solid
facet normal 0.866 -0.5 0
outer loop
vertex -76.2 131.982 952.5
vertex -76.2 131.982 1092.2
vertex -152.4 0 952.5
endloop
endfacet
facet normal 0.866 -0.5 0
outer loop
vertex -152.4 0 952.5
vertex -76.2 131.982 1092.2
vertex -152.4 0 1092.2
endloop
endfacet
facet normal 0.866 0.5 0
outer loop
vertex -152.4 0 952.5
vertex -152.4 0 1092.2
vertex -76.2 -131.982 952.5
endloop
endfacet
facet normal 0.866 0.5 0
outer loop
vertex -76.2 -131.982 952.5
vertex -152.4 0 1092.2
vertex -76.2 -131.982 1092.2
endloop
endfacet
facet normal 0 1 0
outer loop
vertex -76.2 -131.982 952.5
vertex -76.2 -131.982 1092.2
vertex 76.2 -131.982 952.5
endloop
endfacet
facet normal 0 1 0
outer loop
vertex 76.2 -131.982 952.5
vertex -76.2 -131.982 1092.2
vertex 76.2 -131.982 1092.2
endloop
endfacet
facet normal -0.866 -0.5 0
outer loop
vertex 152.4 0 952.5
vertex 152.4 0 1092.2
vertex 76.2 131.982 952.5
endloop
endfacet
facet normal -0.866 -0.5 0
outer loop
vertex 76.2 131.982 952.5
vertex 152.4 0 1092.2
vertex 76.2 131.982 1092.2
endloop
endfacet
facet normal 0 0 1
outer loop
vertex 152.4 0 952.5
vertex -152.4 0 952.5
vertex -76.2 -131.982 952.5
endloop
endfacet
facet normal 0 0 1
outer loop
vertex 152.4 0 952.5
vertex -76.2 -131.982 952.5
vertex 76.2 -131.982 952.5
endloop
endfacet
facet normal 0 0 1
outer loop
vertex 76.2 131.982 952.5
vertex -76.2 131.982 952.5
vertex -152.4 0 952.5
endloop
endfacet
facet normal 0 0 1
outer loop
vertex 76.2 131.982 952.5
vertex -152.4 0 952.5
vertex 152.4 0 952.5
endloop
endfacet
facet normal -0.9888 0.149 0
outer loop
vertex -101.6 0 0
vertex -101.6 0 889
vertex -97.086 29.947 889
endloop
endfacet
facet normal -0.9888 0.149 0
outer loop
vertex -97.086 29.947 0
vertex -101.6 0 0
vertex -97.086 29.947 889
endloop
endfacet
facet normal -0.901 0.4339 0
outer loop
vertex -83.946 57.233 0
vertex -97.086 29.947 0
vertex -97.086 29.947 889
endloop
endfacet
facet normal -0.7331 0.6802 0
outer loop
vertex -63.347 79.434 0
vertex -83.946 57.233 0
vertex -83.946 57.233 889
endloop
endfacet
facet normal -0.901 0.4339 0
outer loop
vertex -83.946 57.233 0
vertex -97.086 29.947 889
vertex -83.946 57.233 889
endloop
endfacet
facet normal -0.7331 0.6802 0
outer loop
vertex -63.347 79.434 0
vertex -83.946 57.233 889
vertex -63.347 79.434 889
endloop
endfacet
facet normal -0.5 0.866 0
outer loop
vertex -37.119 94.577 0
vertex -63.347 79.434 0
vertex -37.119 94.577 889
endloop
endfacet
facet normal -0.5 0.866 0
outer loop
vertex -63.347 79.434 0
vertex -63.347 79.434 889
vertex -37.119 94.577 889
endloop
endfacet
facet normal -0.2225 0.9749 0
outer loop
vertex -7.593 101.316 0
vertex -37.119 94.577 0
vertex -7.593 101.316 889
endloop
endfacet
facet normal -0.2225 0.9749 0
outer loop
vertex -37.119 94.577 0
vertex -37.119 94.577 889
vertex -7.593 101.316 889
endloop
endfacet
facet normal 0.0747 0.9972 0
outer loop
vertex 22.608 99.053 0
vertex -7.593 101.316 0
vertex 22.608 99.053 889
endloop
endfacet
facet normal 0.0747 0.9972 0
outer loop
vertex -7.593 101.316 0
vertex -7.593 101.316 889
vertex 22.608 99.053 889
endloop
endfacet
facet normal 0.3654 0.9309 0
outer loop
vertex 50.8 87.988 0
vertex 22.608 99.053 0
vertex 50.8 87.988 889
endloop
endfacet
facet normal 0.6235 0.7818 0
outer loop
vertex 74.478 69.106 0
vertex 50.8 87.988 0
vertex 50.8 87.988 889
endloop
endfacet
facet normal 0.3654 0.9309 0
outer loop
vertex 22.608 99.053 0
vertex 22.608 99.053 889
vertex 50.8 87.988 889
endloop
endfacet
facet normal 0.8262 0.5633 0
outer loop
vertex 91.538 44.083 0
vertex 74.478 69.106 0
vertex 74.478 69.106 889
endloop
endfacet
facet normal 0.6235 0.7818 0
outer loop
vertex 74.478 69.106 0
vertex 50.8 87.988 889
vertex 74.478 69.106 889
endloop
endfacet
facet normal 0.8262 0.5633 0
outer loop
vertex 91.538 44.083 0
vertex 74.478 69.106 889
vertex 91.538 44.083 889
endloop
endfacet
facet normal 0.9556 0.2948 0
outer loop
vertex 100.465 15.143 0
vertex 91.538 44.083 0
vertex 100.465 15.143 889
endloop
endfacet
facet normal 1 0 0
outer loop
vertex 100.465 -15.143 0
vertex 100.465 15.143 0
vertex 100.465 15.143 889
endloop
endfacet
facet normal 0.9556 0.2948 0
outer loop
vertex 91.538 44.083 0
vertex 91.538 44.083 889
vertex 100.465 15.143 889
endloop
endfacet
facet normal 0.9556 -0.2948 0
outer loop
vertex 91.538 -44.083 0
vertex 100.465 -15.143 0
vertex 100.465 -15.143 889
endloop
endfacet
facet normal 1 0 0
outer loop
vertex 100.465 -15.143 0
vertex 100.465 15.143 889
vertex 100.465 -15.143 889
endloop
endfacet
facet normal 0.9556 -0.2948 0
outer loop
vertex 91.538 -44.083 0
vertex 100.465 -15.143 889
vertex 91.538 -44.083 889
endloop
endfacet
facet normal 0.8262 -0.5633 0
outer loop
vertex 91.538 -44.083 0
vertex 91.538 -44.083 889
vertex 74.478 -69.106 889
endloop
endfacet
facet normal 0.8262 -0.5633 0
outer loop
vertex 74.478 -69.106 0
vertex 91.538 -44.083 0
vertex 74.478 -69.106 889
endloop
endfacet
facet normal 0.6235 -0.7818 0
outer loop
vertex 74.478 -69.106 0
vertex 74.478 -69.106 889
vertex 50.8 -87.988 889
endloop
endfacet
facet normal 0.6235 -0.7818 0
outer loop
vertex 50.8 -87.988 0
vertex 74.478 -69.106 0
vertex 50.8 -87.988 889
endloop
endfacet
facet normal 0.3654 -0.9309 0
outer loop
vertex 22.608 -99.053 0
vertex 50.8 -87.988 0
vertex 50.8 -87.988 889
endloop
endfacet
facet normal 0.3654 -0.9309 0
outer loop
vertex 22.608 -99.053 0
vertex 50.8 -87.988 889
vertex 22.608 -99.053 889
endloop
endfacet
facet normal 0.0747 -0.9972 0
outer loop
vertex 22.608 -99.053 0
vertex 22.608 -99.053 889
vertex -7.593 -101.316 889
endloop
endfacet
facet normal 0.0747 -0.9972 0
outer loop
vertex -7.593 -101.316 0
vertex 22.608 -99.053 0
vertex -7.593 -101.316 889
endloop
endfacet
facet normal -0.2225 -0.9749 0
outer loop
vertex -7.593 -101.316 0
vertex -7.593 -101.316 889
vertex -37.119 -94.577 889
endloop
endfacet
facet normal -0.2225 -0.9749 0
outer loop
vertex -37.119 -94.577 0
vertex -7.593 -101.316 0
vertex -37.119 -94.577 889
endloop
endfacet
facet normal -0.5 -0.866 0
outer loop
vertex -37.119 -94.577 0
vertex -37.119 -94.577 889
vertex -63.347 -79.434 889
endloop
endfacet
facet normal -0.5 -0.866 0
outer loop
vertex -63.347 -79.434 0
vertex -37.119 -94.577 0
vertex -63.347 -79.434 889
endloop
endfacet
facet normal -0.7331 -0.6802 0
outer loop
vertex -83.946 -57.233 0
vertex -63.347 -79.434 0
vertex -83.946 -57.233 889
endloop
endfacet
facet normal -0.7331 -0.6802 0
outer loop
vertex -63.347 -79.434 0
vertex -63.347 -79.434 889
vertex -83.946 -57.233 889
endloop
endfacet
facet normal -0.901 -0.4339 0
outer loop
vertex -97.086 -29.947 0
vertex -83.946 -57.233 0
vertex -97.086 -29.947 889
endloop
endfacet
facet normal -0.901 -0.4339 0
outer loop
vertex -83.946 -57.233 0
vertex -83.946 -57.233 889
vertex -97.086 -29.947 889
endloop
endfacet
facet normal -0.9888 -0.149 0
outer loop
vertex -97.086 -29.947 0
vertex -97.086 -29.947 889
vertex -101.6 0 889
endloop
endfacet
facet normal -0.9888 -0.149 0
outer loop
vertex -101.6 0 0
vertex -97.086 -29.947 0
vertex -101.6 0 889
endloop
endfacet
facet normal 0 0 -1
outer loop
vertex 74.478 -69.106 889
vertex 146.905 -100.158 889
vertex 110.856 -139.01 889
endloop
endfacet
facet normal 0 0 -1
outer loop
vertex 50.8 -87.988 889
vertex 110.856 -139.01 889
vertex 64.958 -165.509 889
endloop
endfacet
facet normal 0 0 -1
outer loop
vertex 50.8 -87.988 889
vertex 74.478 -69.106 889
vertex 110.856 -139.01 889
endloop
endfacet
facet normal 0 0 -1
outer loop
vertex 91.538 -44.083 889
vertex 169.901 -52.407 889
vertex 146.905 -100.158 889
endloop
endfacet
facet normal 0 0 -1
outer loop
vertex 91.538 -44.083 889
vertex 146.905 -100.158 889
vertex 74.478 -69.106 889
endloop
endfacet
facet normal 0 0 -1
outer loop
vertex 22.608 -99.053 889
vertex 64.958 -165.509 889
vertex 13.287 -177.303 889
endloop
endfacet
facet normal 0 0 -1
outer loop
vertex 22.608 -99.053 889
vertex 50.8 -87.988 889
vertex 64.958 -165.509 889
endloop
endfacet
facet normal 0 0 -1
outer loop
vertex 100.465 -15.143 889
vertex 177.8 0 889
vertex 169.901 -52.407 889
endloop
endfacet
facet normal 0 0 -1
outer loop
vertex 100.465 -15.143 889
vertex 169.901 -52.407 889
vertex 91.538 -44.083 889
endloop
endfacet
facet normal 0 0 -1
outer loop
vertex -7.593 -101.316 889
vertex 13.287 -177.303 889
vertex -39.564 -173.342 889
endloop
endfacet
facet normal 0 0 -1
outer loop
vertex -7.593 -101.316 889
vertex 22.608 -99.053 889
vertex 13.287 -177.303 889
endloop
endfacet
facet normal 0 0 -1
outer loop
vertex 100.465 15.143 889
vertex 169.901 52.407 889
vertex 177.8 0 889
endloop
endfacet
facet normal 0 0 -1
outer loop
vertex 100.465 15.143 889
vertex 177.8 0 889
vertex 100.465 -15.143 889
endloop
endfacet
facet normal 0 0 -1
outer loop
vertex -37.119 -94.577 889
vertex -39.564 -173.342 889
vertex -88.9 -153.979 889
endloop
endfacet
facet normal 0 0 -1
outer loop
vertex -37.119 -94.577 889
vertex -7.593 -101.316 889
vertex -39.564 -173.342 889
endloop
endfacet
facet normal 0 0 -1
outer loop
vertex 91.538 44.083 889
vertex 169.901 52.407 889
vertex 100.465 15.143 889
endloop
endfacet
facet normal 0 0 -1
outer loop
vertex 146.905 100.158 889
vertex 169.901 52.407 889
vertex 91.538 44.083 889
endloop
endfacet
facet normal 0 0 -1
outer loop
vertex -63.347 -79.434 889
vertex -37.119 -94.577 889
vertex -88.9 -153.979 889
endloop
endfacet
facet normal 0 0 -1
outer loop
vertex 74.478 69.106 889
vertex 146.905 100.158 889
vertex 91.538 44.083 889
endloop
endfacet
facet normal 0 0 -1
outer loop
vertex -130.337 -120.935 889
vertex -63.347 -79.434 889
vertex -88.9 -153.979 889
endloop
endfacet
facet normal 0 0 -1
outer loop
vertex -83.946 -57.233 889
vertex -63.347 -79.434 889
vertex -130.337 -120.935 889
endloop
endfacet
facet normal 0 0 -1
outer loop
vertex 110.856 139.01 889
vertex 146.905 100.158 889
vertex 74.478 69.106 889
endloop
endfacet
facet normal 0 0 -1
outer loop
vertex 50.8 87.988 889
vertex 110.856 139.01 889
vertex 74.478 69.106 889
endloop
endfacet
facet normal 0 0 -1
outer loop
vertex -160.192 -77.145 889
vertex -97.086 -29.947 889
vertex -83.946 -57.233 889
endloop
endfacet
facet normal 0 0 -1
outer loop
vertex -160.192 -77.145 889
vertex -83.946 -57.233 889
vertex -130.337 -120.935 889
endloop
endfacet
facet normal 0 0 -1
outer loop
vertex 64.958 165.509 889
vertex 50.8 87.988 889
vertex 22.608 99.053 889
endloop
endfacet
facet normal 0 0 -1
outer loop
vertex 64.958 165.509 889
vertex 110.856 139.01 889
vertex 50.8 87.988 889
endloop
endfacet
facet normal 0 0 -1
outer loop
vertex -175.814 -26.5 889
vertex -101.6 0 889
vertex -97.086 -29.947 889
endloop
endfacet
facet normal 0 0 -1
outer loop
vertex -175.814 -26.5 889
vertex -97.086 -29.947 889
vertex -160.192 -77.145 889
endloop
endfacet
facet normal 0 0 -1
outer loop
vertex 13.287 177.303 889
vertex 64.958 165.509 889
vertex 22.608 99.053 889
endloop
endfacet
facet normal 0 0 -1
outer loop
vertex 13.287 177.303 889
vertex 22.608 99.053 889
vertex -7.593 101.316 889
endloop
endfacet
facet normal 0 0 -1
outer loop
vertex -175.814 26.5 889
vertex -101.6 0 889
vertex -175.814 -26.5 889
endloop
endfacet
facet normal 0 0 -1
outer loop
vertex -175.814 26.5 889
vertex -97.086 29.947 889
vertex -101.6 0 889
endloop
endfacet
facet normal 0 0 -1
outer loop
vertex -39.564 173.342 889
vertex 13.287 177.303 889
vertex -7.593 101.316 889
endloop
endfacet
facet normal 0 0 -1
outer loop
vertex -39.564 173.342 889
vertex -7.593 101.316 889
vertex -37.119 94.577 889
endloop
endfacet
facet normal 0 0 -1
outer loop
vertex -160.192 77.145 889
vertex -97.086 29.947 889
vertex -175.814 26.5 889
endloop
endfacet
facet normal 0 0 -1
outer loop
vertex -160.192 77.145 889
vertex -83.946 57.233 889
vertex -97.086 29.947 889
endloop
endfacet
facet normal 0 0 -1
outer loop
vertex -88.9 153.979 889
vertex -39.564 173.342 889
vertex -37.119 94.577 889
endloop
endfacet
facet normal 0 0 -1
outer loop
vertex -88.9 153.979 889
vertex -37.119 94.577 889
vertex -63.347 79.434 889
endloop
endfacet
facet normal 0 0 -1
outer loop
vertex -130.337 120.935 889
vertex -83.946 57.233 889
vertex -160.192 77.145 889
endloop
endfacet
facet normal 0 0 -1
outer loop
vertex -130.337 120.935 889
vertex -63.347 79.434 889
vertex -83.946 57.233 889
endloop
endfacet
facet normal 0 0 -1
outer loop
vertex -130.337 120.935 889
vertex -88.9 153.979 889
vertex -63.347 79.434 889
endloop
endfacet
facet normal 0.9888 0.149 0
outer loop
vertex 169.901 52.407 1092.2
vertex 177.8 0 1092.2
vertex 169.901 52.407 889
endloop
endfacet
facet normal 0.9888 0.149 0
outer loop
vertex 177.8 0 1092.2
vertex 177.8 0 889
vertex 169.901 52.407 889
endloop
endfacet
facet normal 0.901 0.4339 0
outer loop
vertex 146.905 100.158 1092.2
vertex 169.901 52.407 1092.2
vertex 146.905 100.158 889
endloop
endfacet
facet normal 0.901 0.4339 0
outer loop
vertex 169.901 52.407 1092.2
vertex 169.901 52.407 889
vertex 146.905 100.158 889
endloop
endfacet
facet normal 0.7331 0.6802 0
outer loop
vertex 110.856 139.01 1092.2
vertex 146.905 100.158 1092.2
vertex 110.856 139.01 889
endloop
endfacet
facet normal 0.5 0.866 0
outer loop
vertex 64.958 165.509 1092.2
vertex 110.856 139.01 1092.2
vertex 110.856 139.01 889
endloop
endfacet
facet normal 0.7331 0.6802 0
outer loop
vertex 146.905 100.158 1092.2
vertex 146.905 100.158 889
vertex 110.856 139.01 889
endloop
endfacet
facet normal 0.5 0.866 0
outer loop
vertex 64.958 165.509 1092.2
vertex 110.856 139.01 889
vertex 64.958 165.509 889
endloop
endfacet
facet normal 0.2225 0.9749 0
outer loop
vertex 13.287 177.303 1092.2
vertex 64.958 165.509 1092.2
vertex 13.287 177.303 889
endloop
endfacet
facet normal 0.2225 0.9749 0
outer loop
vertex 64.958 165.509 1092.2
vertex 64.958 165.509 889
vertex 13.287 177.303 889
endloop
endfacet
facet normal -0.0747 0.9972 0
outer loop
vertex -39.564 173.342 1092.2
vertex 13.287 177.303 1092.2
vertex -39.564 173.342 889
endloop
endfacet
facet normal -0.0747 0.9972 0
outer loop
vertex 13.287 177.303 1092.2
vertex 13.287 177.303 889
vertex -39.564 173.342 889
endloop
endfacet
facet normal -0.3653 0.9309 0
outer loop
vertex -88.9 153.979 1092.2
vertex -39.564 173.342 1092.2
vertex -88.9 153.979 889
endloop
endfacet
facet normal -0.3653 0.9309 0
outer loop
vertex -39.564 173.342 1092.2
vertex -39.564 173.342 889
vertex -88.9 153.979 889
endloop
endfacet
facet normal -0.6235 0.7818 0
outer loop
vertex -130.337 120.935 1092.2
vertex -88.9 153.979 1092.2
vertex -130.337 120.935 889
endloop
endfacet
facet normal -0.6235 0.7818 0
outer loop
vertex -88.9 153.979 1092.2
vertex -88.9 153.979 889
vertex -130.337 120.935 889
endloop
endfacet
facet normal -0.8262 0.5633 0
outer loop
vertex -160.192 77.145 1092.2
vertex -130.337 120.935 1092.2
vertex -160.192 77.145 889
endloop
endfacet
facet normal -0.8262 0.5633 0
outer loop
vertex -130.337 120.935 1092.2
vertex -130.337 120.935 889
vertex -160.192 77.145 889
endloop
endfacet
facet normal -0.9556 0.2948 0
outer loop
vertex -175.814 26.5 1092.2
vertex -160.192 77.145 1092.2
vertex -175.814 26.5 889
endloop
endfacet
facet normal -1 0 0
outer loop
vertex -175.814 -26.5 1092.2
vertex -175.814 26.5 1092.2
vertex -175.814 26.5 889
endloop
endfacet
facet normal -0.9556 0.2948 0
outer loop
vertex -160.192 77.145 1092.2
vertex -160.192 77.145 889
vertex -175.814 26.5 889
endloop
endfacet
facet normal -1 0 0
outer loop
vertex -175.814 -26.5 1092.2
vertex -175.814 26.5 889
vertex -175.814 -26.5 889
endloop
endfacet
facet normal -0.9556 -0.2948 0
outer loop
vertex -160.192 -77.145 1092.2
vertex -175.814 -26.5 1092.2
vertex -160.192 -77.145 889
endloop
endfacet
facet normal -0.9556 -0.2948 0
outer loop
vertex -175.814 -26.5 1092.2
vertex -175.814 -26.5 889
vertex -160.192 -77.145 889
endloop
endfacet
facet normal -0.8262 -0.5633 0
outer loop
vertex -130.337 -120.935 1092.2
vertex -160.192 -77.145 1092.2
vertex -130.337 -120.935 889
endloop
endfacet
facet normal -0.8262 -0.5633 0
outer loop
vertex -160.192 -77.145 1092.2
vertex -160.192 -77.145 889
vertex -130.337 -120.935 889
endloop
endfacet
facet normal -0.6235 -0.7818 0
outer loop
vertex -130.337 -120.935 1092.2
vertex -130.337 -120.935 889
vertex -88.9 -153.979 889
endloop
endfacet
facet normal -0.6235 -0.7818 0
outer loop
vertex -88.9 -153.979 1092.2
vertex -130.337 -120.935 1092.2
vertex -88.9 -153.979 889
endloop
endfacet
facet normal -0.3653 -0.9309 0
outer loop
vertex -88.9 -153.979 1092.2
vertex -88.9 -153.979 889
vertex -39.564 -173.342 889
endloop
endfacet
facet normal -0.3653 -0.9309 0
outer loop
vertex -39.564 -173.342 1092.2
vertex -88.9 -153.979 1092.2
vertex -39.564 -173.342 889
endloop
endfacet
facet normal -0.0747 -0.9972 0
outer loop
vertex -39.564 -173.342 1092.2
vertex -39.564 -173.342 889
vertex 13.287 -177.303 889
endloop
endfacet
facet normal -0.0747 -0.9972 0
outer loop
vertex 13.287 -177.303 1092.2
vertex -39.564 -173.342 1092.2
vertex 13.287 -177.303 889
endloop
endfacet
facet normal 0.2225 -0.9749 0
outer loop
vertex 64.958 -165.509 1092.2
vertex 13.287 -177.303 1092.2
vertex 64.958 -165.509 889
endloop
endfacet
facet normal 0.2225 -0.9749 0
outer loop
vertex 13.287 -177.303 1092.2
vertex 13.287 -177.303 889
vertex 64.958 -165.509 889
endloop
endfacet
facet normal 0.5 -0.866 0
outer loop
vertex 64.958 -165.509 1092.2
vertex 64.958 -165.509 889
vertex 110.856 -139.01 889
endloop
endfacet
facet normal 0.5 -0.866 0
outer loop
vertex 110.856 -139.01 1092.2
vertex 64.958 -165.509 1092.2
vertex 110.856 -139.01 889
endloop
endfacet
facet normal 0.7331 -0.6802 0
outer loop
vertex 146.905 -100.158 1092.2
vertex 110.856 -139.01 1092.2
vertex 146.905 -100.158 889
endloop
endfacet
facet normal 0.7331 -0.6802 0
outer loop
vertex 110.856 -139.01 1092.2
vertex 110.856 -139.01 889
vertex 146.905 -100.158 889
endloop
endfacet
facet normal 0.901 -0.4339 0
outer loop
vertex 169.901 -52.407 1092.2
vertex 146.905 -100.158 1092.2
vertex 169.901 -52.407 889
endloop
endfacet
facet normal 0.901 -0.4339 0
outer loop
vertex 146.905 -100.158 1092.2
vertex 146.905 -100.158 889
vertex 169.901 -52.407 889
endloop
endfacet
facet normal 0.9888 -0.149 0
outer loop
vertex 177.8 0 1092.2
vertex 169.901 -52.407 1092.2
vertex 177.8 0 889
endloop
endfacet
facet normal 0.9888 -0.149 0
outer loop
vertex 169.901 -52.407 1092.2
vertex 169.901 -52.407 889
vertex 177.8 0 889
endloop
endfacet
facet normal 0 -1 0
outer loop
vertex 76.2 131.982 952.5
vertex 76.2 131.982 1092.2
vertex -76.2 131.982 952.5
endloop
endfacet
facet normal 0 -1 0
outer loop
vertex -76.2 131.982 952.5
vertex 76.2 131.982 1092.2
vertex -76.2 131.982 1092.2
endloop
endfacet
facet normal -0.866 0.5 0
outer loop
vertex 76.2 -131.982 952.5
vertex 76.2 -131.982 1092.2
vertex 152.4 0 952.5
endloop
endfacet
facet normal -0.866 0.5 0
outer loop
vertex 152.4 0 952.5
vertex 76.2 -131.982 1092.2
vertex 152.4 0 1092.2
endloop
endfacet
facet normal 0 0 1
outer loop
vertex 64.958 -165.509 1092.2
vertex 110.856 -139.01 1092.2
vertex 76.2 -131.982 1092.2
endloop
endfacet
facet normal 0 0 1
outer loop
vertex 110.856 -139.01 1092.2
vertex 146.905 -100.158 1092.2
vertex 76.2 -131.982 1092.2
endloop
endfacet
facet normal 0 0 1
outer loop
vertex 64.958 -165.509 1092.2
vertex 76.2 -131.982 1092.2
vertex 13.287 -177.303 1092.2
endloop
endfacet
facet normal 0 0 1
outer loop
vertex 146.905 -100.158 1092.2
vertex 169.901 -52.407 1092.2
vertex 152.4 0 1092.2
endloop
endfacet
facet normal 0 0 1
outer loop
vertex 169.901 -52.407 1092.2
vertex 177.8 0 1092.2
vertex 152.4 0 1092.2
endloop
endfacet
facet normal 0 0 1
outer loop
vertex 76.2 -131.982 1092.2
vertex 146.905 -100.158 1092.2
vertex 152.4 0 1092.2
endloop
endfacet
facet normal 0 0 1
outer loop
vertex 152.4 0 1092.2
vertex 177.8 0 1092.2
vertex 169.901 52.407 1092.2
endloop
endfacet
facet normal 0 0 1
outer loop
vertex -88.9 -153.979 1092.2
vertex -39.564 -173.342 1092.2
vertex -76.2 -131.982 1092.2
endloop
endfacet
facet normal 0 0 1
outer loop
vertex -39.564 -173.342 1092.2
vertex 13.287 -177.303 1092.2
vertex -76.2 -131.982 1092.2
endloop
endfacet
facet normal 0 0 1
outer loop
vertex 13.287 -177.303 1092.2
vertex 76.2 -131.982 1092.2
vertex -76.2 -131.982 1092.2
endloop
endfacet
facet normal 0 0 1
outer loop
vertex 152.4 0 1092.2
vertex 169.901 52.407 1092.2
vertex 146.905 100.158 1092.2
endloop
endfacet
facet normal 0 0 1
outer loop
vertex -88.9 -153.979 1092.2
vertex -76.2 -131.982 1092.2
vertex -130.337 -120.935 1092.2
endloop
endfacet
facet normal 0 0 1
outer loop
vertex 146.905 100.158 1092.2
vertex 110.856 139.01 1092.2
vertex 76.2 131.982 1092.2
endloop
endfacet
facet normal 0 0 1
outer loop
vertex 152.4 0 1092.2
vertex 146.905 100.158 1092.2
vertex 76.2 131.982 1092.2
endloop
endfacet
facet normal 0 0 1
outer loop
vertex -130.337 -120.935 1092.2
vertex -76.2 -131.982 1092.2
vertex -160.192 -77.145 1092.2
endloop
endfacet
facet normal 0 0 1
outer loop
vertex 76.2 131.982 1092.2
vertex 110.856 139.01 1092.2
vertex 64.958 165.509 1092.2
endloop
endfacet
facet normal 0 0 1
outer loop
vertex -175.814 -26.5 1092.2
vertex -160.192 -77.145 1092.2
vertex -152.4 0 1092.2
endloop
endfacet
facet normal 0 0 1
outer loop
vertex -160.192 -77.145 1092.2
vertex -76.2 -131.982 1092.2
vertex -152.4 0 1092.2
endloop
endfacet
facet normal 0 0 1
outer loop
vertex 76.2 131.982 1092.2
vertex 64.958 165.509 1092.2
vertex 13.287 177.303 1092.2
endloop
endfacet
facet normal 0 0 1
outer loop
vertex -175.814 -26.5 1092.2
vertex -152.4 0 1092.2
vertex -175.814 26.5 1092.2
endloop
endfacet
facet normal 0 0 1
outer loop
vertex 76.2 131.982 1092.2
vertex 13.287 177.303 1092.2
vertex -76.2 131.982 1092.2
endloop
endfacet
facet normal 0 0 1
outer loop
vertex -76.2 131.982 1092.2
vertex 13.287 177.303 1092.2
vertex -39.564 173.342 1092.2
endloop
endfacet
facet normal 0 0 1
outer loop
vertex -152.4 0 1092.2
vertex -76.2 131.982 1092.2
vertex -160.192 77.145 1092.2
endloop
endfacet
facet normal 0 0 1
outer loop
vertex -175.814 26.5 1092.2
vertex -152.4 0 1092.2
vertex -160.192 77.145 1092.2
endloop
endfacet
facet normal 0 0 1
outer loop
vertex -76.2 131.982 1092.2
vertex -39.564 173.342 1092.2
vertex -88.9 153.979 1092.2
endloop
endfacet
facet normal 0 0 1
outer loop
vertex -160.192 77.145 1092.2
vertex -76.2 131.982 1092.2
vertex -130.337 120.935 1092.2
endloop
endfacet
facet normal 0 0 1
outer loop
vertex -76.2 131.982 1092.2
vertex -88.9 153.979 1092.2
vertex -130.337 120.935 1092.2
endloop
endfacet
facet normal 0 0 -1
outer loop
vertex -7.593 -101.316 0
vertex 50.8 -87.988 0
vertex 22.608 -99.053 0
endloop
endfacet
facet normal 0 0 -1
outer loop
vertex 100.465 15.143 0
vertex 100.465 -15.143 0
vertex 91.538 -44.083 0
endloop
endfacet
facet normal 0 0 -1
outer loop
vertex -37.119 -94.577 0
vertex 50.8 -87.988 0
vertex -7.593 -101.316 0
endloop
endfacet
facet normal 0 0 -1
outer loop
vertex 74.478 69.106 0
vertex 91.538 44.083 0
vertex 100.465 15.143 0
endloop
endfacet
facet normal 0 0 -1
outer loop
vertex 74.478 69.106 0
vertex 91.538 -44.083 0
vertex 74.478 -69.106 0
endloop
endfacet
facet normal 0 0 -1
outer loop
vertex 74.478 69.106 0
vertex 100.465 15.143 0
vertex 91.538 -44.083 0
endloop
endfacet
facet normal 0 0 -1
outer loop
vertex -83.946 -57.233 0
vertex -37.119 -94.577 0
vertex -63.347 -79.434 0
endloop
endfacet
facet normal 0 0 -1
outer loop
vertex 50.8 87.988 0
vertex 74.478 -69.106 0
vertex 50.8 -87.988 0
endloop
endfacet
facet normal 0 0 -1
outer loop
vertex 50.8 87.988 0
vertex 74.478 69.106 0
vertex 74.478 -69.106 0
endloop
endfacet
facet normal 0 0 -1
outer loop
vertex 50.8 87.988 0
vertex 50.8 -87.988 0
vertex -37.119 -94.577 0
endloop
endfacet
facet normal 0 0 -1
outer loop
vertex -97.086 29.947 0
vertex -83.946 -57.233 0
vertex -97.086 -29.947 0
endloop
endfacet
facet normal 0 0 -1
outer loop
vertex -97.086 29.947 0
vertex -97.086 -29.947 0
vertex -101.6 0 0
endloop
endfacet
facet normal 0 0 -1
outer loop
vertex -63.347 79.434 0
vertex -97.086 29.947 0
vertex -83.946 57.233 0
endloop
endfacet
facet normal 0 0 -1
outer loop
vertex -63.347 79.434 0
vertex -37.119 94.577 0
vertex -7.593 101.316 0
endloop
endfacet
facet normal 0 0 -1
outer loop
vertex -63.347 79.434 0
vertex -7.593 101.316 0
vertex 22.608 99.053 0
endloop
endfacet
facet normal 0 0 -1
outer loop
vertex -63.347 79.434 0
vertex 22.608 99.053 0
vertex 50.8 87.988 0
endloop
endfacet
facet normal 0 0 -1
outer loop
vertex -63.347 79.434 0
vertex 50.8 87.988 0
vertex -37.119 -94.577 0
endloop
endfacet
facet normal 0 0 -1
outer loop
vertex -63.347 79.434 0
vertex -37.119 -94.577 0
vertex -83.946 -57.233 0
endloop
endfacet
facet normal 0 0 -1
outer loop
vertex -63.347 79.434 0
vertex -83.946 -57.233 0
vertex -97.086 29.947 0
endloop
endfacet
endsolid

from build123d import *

# Parameters (mm, degrees)
SKETCH1_W           = 177.8
SKETCH1_H           = 203.2
SKETCH2_R           = 101.6
BOSS_EXTRUDE1_DEPTH = 889
CUT_EXTRUDE1_DEPTH  = 139.7


with BuildPart() as part:
    # Sketch1 → Revolve1 (revolve)
    with BuildSketch(Plane(origin=(0, 0, 0), x_dir=(1, 0, 0), z_dir=(0, 1, 0))):
        with Locations((88.9, -990.6)):
            Rectangle(SKETCH1_W, SKETCH1_H)
    revolve(axis=Axis((0, 0, 889), (0, 0, 1)))

    # Sketch2 → Boss-Extrude1 (add)
    with BuildSketch(Plane(origin=(0, 0, 889), x_dir=(-1, 0, 0), z_dir=(0, 0, -1))):
        Circle(SKETCH2_R)
    extrude(amount=BOSS_EXTRUDE1_DEPTH)

    # Sketch3 → Cut-Extrude1 (cut)
    with BuildSketch(Plane.XY.offset(1092.2)):
        Polygon((-152.4, 0), (-76.2, -131.982271537), (76.2, -131.982271537), (152.4, 0), (76.2, 131.982271537), (-76.2, 131.982271537), align=None)
    extrude(amount=-CUT_EXTRUDE1_DEPTH, mode=Mode.SUBTRACT)


solid = part.part
